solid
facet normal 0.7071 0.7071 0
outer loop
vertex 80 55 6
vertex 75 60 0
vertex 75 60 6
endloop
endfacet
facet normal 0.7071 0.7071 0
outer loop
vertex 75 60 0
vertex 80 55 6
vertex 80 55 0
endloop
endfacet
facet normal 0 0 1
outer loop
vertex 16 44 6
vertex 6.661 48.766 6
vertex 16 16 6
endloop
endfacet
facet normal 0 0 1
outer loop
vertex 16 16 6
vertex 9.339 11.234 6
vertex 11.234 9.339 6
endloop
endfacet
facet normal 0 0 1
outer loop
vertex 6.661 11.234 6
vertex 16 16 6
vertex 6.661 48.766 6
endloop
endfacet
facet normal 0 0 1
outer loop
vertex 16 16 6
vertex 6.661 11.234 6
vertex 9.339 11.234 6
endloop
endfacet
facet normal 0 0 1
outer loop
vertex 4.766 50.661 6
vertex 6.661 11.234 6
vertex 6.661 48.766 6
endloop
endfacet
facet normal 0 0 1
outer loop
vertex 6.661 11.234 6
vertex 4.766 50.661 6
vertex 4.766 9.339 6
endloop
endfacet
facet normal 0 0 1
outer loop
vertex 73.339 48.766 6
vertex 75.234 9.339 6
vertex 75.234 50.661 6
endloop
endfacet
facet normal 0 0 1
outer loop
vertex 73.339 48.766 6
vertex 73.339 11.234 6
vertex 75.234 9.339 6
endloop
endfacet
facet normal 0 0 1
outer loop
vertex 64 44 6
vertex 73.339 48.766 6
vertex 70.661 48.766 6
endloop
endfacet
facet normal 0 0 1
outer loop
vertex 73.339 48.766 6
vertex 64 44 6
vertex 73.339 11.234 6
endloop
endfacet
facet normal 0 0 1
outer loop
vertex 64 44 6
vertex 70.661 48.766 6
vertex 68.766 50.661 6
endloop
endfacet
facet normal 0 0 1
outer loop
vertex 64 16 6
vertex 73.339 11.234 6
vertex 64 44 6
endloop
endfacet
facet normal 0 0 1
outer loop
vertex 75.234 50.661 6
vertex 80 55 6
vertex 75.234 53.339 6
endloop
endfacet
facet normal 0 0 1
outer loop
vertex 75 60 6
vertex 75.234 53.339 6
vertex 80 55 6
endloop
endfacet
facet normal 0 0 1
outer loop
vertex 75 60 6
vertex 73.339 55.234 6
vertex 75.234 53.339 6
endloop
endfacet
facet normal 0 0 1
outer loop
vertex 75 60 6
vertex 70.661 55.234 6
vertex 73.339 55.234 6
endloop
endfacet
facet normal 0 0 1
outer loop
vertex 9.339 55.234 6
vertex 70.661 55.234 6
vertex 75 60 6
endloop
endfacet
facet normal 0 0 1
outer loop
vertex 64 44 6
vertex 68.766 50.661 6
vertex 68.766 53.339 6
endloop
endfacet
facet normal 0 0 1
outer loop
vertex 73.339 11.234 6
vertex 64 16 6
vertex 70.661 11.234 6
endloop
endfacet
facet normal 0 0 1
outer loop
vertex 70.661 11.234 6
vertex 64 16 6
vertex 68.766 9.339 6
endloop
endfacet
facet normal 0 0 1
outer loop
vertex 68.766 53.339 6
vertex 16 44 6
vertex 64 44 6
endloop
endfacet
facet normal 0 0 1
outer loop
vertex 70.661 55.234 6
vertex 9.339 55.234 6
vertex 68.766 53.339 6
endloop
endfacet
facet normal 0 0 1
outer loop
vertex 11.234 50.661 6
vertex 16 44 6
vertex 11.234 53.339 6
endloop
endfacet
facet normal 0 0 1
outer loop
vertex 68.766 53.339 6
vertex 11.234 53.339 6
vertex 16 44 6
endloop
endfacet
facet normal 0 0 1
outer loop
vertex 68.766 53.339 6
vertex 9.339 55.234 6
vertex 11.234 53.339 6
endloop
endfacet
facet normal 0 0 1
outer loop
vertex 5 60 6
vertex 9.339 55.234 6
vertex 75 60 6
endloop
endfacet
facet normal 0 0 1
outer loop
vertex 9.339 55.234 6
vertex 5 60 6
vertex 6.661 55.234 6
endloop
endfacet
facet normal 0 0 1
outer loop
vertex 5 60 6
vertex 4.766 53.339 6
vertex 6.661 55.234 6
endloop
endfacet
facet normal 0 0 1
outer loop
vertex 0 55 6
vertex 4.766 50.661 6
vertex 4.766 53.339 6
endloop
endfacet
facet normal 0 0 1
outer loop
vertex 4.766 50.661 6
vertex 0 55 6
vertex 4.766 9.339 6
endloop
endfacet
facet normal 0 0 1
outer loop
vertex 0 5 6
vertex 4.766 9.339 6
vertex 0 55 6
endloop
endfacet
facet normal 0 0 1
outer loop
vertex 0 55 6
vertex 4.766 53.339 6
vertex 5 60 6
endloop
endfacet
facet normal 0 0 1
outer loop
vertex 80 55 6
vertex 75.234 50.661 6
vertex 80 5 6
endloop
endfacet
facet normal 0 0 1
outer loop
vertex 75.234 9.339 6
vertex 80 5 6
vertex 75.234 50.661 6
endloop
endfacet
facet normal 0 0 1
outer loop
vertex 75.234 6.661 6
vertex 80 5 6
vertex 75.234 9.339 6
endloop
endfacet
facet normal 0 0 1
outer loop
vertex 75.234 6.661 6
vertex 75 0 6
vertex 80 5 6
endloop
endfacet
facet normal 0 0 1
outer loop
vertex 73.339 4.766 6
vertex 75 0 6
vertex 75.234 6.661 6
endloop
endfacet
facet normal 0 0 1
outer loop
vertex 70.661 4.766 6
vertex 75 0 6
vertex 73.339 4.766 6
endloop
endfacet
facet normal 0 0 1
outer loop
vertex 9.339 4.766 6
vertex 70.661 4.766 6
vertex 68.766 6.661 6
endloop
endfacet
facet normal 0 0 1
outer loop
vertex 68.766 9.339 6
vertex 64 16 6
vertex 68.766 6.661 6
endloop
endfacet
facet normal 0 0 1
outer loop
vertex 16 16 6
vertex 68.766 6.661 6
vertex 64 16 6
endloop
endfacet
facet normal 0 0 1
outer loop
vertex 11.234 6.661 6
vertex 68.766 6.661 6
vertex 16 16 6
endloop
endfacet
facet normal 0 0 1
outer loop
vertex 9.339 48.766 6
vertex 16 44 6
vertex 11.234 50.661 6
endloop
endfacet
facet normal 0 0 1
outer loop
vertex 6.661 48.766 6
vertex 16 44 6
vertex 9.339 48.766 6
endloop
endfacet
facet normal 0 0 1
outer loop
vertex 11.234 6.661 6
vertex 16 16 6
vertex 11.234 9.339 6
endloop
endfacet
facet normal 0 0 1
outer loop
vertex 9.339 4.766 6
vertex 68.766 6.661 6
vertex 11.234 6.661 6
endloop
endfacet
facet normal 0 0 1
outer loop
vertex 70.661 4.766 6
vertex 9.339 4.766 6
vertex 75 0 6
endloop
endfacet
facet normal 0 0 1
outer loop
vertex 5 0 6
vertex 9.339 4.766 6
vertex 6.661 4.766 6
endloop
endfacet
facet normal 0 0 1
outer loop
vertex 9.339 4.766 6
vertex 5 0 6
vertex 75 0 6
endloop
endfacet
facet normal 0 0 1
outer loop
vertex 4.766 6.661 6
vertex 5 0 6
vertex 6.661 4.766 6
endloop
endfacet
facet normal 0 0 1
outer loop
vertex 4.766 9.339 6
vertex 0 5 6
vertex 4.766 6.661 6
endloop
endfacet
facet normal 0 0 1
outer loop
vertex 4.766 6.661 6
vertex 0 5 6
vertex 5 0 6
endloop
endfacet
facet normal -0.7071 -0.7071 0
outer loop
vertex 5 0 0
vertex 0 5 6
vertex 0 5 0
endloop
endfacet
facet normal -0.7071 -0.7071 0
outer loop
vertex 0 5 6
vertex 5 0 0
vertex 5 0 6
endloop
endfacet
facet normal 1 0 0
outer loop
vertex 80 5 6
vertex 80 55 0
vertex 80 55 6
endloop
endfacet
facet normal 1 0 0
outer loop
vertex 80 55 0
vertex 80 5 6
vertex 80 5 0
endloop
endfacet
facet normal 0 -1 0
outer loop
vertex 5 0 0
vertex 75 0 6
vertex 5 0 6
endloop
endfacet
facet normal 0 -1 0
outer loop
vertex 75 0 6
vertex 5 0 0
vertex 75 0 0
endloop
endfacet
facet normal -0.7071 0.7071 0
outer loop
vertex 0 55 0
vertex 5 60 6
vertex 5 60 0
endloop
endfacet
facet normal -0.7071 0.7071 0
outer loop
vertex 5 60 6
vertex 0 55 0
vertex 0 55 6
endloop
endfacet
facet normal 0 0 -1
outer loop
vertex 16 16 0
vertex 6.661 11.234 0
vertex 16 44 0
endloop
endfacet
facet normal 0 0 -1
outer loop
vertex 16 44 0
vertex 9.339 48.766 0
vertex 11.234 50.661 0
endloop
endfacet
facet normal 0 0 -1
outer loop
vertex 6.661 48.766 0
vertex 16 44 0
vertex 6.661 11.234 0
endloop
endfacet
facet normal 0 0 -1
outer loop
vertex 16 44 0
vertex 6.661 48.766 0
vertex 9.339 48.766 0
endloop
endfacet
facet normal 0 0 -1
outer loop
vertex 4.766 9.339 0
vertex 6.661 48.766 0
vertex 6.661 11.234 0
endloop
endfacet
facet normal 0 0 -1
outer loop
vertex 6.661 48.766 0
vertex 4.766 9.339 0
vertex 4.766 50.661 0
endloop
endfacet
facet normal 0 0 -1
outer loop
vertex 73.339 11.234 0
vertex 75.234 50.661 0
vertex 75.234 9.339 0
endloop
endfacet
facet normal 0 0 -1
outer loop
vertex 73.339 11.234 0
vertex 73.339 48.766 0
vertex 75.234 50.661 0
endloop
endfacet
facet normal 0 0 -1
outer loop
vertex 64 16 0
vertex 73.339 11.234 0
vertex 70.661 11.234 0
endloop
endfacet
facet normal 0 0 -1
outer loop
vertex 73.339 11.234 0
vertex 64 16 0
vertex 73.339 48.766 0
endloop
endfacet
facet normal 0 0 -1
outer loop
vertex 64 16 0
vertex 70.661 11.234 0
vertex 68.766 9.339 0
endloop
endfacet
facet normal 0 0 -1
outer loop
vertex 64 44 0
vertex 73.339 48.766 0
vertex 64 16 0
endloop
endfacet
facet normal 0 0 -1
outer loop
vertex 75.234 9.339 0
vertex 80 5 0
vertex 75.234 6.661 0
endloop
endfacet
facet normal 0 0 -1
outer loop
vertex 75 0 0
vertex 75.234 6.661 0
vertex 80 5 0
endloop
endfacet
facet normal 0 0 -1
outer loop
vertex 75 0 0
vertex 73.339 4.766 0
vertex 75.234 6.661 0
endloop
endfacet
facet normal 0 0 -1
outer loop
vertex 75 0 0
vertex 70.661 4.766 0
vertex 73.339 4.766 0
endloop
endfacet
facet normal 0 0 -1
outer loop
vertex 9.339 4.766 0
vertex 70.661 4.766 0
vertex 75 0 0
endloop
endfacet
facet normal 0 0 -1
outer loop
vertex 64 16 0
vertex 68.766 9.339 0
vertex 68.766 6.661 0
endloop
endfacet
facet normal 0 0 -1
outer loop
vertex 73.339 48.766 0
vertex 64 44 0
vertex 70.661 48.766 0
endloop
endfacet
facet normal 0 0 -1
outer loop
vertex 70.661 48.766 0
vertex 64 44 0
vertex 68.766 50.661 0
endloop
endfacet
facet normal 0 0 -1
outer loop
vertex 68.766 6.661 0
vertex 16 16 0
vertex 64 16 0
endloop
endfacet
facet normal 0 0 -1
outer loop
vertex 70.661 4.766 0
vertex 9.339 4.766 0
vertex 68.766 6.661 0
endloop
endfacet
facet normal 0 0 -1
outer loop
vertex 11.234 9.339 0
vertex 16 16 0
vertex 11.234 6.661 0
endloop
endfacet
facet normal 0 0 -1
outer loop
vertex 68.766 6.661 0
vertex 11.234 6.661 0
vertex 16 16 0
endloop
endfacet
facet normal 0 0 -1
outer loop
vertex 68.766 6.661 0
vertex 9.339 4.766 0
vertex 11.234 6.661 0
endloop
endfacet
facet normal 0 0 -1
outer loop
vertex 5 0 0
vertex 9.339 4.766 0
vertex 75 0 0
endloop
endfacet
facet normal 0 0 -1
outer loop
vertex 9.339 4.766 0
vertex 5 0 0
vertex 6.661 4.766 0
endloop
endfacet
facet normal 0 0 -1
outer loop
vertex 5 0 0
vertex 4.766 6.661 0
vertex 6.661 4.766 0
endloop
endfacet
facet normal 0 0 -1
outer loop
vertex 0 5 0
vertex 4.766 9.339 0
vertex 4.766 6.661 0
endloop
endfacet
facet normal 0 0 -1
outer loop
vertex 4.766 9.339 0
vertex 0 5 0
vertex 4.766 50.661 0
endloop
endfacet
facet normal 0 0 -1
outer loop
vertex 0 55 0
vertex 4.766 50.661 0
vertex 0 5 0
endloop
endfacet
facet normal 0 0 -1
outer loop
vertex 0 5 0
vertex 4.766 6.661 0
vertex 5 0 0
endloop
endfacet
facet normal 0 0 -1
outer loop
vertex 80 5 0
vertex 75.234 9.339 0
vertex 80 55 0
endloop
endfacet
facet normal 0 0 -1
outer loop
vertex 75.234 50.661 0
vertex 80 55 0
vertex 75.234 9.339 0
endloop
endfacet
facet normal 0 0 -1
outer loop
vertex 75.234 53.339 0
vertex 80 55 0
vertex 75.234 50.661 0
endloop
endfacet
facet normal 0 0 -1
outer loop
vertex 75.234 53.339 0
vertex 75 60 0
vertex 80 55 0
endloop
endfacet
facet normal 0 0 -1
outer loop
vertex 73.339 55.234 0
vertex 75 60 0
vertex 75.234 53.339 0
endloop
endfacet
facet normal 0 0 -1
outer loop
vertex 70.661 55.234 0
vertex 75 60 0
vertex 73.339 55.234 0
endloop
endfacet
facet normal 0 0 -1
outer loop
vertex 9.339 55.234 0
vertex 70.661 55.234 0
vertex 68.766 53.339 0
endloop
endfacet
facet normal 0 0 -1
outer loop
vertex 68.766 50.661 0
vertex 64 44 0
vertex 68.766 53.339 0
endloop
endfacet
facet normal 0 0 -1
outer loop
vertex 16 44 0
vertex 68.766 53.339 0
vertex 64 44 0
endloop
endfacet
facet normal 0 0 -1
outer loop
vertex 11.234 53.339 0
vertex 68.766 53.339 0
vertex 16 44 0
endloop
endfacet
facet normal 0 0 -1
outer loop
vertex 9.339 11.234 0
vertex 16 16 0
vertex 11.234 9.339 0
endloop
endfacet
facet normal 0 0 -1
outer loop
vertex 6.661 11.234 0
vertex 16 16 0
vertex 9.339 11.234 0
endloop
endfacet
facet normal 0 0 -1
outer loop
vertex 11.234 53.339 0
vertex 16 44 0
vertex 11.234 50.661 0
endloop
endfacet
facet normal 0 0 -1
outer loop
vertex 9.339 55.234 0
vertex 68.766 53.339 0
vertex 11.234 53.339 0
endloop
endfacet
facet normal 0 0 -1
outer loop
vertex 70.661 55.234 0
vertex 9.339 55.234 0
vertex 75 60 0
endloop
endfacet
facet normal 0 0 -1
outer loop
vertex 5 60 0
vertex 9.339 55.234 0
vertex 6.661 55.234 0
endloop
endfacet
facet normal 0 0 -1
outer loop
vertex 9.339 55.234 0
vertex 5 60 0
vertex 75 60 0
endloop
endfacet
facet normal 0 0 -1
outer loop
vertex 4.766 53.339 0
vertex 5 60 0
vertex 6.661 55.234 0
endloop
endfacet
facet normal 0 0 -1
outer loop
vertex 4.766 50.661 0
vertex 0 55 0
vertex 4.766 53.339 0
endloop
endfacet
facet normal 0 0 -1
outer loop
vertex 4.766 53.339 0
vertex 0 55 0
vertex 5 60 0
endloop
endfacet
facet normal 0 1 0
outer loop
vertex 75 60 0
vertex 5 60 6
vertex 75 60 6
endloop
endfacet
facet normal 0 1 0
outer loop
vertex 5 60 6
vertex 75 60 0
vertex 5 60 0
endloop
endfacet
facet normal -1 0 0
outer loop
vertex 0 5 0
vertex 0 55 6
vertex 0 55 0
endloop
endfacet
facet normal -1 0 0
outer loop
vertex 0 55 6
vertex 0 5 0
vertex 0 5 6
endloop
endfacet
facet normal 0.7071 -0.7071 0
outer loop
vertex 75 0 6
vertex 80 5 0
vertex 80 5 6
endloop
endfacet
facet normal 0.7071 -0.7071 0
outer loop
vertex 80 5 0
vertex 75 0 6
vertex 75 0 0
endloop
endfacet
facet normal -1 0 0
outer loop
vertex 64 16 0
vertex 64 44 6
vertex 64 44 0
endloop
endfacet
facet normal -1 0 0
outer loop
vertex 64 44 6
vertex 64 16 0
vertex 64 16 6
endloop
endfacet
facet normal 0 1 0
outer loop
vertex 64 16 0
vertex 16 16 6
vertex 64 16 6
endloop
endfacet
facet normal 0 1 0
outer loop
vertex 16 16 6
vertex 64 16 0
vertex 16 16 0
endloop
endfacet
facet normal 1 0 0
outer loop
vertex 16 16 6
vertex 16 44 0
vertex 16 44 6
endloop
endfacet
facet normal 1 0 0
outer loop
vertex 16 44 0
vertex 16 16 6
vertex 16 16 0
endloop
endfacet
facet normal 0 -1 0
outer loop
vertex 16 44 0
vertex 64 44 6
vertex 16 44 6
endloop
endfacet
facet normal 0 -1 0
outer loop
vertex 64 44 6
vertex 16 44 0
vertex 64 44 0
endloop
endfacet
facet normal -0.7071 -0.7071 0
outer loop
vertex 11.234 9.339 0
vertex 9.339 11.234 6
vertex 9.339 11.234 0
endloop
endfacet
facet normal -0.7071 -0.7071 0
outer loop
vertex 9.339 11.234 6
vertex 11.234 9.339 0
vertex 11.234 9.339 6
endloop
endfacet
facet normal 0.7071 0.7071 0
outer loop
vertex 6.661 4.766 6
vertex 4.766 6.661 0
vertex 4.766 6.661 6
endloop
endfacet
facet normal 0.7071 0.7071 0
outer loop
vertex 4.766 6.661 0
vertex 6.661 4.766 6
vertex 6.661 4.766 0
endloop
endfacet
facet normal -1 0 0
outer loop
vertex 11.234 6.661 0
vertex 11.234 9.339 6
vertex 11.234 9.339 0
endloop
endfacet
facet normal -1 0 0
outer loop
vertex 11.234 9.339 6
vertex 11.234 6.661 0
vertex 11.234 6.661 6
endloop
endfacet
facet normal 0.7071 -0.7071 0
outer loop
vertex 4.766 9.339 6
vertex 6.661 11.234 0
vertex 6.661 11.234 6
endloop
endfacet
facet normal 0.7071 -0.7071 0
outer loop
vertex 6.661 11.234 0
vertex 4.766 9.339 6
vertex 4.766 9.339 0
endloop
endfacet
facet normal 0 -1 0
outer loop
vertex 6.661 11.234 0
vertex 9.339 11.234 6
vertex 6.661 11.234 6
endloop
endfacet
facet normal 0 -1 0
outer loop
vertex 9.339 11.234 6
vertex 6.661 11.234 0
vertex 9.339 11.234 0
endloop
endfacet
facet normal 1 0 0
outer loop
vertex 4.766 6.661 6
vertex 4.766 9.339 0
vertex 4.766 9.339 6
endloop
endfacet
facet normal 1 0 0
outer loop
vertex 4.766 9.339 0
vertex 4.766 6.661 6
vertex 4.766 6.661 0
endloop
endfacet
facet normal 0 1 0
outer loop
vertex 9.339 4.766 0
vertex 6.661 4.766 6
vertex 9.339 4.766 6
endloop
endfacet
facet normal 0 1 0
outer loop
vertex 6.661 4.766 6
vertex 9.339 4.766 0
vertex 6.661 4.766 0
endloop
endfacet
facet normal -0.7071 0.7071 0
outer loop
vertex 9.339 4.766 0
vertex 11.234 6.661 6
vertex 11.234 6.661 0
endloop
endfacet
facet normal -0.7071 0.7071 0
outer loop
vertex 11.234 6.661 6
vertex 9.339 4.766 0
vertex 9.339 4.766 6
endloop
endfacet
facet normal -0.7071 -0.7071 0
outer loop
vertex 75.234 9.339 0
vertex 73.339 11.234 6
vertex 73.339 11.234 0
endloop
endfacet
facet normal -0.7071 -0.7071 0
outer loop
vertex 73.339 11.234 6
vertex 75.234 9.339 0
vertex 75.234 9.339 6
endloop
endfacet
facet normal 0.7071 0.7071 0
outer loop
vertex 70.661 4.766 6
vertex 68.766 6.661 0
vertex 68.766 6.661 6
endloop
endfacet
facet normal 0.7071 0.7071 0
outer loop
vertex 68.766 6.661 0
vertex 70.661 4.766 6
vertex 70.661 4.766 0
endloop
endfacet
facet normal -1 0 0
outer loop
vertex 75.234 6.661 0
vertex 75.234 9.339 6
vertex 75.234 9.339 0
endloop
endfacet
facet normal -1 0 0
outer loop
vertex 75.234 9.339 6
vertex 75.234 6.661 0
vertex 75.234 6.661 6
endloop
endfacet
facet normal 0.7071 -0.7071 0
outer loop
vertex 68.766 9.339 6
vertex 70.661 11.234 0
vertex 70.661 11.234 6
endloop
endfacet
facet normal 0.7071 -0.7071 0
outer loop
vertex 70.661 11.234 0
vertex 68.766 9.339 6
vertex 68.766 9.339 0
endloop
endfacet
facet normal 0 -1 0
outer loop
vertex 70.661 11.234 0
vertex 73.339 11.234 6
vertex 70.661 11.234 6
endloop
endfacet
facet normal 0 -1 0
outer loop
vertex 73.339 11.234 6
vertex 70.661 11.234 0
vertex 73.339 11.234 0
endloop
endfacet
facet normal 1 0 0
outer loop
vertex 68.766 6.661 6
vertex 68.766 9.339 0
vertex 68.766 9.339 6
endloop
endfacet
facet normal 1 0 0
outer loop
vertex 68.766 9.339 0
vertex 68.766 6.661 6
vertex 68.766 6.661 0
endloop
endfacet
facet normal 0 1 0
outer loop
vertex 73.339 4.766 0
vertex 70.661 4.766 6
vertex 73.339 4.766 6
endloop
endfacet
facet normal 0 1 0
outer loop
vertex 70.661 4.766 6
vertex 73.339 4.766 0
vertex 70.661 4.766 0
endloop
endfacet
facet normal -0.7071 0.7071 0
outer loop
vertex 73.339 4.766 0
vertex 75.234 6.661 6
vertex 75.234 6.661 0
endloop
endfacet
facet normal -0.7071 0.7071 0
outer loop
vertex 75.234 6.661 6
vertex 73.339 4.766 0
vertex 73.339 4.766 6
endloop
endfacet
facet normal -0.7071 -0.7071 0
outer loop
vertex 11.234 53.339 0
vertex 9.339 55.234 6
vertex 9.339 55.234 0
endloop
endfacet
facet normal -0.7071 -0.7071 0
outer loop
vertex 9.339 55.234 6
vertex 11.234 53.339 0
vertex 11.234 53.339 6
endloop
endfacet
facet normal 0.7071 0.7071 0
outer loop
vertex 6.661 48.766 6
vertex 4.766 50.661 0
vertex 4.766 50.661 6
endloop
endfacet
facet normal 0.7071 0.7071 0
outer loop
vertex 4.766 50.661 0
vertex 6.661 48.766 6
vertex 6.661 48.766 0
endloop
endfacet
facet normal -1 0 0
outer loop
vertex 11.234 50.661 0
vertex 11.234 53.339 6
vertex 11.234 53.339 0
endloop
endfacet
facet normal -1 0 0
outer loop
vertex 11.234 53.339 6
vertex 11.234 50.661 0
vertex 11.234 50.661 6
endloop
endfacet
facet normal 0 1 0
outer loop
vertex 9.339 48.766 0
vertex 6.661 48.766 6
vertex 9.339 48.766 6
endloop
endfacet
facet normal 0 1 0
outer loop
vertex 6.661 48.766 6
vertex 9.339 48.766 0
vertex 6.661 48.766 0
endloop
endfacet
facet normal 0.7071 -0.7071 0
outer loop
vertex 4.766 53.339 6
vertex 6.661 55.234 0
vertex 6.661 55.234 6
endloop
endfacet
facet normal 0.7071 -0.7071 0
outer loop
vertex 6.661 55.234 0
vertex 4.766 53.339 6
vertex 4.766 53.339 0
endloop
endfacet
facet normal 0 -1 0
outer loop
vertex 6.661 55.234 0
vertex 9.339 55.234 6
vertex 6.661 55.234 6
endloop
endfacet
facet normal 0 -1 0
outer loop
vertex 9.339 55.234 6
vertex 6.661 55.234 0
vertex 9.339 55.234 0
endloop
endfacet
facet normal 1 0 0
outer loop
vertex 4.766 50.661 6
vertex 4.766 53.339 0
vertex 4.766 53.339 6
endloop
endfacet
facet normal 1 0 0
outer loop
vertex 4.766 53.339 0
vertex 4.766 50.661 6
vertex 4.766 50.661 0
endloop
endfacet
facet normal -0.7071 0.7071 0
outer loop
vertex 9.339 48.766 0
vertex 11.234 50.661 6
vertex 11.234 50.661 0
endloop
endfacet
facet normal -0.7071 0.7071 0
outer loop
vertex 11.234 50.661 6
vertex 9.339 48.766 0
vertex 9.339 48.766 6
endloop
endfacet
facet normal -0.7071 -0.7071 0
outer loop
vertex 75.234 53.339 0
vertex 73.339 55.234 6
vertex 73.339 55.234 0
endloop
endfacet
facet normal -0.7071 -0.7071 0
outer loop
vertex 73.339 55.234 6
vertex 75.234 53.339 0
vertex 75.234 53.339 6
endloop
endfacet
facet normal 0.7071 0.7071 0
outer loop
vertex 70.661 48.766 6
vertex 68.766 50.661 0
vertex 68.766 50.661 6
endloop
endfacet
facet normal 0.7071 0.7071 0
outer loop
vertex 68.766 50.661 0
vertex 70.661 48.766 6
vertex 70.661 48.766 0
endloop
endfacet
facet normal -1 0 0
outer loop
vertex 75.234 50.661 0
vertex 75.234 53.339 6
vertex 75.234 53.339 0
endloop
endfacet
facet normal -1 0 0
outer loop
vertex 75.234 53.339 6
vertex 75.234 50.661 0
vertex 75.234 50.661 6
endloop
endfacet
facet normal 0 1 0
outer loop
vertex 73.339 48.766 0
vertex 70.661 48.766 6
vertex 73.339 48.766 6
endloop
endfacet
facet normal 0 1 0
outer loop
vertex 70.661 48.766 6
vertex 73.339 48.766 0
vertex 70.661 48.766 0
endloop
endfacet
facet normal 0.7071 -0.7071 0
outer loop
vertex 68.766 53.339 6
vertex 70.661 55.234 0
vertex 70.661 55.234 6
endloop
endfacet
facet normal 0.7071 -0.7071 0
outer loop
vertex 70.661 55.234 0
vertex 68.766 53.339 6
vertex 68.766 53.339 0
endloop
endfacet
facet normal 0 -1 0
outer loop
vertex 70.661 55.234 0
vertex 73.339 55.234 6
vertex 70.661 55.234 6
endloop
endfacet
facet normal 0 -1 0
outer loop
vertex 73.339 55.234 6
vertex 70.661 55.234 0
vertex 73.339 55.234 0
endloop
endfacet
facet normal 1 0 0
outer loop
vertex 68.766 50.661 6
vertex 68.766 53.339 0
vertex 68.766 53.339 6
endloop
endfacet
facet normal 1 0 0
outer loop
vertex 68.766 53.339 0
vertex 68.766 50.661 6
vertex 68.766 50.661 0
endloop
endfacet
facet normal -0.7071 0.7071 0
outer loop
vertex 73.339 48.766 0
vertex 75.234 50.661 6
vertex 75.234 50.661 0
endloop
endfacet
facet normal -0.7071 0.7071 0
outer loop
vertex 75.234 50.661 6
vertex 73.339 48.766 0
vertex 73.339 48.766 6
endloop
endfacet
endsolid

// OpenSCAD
$fn = 32;

// ----------------------------------------------------------------------
// Frame plate: 80 x 60 frame, 16 mm rails
// ----------------------------------------------------------------------

// --- parameters (mm) ---
plate_l = 80;             // plate length, X
plate_w = 60;             // plate width, Y
plate_t = 6;              // plate thickness, Z (extrusion height)
corner_c = 5;             // corner chamfer
frame_bar = 16;           // frame rail width
bolt_r = 3.5;             // corner bolt window radius
bolt_inset = 8;           // bolt centre inset from the edges
fit_tol = 0.02;           // declared fit tolerance (prompt contract)
free_tol = 0.2;           // declared free tolerance (prompt contract)

win_l = plate_l - 2 * frame_bar;  // window length
win_w = plate_w - 2 * frame_bar;  // window width
bolt_d = 2 * bolt_r;  // corner hole diameter

profile = [[5, 0], [75, 0], [80, 5], [80, 55], [75, 60], [5, 60], [0, 55], [0, 5]];  // primary outline, 8 points, counter clockwise
void_1 = [[16, 16], [64, 16], [64, 44], [16, 44]];  // the window, 4 points
void_2 = [[11.234, 9.339], [9.339, 11.234], [6.661, 11.234], [4.766, 9.339], [4.766, 6.661], [6.661, 4.766], [9.339, 4.766], [11.234, 6.661]];  // corner bolt window, 8 points
void_3 = [[75.234, 9.339], [73.339, 11.234], [70.661, 11.234], [68.766, 9.339], [68.766, 6.661], [70.661, 4.766], [73.339, 4.766], [75.234, 6.661]];  // corner bolt window, 8 points
void_4 = [[11.234, 53.339], [9.339, 55.234], [6.661, 55.234], [4.766, 53.339], [4.766, 50.661], [6.661, 48.766], [9.339, 48.766], [11.234, 50.661]];  // corner bolt window, 8 points
void_5 = [[75.234, 53.339], [73.339, 55.234], [70.661, 55.234], [68.766, 53.339], [68.766, 50.661], [70.661, 48.766], [73.339, 48.766], [75.234, 50.661]];  // corner bolt window, 8 points

// --- the one profile operation ---
difference() {
  linear_extrude(height = plate_t) polygon(points = profile);
  translate([0, 0, -1])
    linear_extrude(height = plate_t + 2) polygon(points = void_1);
  translate([0, 0, -1])
    linear_extrude(height = plate_t + 2) polygon(points = void_2);
  translate([0, 0, -1])
    linear_extrude(height = plate_t + 2) polygon(points = void_3);
  translate([0, 0, -1])
    linear_extrude(height = plate_t + 2) polygon(points = void_4);
  translate([0, 0, -1])
    linear_extrude(height = plate_t + 2) polygon(points = void_5);
}
